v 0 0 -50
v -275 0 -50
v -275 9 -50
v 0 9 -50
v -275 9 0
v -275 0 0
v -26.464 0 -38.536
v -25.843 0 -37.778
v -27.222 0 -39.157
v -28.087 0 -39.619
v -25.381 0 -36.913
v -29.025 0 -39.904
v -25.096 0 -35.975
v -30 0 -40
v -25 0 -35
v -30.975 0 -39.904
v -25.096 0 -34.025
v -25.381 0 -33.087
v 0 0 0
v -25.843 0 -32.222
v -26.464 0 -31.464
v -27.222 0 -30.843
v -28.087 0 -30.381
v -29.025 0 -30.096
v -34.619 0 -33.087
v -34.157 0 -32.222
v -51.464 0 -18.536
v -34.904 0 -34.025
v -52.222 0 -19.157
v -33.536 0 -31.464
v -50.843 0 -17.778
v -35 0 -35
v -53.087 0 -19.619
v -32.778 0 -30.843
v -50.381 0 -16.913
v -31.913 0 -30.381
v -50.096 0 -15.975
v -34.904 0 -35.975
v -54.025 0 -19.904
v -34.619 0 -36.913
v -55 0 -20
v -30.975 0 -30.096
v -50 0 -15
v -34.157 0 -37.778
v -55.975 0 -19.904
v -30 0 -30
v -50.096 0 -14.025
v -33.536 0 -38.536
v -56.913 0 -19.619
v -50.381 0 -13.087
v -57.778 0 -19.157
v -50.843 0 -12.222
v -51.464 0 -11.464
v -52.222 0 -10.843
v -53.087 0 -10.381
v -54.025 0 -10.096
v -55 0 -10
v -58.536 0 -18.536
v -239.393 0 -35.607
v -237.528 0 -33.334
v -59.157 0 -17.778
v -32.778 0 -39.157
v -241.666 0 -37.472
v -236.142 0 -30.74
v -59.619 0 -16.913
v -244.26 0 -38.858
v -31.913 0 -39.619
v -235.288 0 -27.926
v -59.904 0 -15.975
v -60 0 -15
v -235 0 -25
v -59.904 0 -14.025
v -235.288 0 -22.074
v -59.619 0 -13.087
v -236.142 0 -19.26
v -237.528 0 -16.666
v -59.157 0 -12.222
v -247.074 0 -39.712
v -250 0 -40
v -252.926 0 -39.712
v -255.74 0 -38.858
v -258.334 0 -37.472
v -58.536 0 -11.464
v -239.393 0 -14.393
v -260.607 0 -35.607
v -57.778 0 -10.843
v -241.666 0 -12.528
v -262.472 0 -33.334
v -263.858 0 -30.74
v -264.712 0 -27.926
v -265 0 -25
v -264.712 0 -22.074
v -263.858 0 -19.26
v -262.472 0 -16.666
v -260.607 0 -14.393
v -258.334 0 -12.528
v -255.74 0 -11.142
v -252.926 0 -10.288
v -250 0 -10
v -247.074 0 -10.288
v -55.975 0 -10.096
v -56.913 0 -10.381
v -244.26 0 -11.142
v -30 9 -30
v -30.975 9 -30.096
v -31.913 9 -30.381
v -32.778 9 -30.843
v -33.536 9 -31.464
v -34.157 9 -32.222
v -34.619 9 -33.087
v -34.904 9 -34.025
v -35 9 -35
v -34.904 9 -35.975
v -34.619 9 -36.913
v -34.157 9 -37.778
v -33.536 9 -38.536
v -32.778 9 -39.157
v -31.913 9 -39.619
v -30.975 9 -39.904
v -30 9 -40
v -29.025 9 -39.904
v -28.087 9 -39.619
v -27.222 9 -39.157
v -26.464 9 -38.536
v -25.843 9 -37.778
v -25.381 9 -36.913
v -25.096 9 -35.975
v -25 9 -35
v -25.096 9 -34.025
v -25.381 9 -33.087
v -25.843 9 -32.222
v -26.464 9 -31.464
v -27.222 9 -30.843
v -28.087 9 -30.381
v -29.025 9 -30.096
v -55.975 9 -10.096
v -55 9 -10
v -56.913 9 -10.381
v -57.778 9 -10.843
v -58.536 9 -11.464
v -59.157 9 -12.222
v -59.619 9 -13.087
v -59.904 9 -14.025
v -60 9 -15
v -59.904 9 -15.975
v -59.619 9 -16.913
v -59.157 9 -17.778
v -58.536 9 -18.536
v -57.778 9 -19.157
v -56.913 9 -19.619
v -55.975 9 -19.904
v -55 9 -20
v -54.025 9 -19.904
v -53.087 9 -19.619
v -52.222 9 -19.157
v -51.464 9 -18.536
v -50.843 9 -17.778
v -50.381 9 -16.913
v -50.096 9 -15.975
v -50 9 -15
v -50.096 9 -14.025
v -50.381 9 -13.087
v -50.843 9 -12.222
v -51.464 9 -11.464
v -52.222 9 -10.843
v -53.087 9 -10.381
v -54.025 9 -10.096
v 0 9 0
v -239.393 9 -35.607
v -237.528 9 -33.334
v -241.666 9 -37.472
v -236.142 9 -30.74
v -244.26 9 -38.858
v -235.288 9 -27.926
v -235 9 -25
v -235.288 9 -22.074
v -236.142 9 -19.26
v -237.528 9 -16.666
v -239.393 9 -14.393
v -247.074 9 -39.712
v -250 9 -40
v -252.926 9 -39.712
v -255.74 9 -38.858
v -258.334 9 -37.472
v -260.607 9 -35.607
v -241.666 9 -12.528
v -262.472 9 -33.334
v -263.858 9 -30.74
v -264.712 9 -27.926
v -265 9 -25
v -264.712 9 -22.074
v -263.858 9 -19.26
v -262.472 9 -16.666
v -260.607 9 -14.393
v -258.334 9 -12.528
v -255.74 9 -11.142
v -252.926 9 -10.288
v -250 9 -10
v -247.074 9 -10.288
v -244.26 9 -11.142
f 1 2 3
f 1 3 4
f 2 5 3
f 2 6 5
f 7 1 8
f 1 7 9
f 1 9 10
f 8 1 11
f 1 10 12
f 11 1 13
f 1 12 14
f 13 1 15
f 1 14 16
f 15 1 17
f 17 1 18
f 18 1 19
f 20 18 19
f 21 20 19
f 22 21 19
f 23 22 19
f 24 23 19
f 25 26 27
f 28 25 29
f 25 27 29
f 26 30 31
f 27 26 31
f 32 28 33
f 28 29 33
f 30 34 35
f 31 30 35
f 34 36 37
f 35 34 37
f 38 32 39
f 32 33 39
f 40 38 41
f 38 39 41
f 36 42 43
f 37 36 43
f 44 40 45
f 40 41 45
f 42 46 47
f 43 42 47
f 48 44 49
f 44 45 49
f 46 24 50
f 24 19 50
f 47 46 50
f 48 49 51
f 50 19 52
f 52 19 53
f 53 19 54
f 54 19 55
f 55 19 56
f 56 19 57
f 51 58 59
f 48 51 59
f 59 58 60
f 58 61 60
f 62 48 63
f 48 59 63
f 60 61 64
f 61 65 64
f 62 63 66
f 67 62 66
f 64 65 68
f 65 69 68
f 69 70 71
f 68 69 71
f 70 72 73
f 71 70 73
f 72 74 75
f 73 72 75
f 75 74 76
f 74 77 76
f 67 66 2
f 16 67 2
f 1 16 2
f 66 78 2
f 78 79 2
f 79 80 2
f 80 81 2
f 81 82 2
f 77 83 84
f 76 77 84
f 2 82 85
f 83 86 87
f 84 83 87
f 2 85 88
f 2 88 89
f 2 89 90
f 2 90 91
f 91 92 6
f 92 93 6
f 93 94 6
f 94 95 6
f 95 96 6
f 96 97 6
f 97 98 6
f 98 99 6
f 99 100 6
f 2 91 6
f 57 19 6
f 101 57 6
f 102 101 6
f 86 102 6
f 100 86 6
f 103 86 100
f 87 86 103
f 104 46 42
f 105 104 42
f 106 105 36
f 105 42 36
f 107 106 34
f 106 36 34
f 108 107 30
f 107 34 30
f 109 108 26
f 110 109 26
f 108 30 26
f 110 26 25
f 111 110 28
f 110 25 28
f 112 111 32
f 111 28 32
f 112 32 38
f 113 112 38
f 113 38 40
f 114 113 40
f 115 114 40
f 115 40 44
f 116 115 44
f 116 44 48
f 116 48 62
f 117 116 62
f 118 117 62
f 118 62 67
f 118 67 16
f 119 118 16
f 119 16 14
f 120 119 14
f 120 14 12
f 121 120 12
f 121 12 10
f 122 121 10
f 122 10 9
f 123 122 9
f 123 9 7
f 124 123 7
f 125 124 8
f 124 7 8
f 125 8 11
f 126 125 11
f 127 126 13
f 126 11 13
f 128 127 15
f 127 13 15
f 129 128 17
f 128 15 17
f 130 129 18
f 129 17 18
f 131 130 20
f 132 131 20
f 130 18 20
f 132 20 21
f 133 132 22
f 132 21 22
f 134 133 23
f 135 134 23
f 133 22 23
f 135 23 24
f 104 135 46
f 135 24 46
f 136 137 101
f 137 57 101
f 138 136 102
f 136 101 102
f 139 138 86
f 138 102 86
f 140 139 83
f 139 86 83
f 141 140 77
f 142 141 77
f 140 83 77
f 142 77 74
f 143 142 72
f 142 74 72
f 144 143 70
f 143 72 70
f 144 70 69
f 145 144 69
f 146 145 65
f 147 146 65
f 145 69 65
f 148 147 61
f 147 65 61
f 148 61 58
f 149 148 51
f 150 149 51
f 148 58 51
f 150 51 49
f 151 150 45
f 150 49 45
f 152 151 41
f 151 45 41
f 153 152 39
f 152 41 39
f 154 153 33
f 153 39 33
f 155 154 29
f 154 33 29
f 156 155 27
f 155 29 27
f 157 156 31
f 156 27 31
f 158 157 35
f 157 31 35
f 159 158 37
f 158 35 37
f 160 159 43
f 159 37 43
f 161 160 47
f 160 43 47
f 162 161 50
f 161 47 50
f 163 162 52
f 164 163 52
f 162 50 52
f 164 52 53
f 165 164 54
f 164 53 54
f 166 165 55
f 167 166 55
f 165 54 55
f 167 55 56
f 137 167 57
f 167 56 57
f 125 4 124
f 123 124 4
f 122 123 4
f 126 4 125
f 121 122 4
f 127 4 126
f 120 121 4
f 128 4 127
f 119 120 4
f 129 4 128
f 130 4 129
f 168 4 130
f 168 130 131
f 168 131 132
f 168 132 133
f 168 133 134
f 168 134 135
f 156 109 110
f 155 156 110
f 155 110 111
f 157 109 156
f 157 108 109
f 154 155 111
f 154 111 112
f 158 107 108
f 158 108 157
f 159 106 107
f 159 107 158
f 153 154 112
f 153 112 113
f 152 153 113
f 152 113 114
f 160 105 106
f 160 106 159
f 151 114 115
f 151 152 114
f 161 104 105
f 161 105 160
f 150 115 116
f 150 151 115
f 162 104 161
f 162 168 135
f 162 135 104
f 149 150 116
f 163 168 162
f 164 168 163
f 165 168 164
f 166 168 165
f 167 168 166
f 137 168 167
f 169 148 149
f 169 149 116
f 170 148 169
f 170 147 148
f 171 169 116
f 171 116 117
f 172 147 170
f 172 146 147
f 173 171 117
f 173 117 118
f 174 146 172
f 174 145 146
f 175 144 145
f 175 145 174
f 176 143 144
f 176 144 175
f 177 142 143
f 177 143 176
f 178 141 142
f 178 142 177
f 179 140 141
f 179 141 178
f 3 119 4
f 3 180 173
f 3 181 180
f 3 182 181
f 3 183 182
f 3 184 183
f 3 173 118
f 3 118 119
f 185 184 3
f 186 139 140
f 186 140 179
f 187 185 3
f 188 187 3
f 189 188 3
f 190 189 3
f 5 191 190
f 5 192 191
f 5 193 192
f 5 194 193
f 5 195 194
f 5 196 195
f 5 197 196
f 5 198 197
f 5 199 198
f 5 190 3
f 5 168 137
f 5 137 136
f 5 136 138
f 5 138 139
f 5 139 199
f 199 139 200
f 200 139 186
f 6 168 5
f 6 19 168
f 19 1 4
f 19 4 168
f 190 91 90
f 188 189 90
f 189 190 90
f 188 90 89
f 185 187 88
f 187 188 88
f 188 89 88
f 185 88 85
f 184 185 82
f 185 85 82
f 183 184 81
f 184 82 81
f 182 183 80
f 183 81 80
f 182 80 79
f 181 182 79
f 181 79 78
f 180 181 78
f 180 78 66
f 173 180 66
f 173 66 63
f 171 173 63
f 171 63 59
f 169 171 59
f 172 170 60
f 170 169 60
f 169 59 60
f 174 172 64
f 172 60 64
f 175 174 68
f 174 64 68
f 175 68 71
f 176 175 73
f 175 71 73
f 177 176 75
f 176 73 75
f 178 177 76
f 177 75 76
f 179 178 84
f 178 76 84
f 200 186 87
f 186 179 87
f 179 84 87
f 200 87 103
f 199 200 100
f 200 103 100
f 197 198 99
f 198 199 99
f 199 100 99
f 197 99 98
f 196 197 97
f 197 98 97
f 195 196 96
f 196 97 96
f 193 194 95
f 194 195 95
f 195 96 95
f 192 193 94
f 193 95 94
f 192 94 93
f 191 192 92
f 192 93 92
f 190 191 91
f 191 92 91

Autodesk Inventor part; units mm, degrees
ref_plane "YZ Plane" through (0, 0, 0) normal (1, 0, 0) x (0, 1, 0)
ref_plane "XZ Plane" through (0, 0, 0) normal (0, 1, 0) x (-1, 0, 0)
ref_plane "XY Plane" through (0, 0, 0) normal (0, 0, 1) x (1, 0, 0)
sketch "Skizze1" plane through (0, 0, 0) normal (0, 1, 0) x (-1, 0, 0)
  line L0 (0, 0) -> (275, 0)
  line L1 (275, 0) -> (275, -50)
  line L2 (275, -50) -> (0, -50)
  line L3 (0, -50) -> (0, 0)
  line L4 (275, 0) -> (275, -25)
  line L5 (275, -25) -> (250, -25)
  circle A0 centre (250, -25) radius 15
  dimension "d0" = 275
  dimension "d1" = 50
  dimension "d2" = 25
  dimension "d3" = 30
extrude "Extrusion1" add sketch "Skizze1" along normal blind 9
sketch "Skizze2" plane through (0, 9, 0) normal (0, 1, 0) x (1, 0, 0)
  line L0 (0, 0) -> (0, 50) projected
  line L1 (0, 50) -> (-30, 50)
  line L2 (-30, 50) -> (-30, 35)
  line L3 (0, 0) -> (-55, 0)
  line L4 (-275, 0) -> (0, 0) projected
  line L5 (-55, 0) -> (-70, 0)
  line L6 (-70, 0) -> (-55, 0)
  line L7 (-55, 0) -> (-55, 15)
  dimension "d6" = 30
  dimension "d7" = 15
  dimension "d8" = 55
  dimension "d9" = 15
  dimension "d10" = 15
hole "Bohrung1" at (-55, 9, -15) at (-30, 9, -35) direction (0, -1, 0) diameter 10 depth 10 tip angle 118
properties part number "Lagerstuetze_kurz" material "Holz (Birke)"
